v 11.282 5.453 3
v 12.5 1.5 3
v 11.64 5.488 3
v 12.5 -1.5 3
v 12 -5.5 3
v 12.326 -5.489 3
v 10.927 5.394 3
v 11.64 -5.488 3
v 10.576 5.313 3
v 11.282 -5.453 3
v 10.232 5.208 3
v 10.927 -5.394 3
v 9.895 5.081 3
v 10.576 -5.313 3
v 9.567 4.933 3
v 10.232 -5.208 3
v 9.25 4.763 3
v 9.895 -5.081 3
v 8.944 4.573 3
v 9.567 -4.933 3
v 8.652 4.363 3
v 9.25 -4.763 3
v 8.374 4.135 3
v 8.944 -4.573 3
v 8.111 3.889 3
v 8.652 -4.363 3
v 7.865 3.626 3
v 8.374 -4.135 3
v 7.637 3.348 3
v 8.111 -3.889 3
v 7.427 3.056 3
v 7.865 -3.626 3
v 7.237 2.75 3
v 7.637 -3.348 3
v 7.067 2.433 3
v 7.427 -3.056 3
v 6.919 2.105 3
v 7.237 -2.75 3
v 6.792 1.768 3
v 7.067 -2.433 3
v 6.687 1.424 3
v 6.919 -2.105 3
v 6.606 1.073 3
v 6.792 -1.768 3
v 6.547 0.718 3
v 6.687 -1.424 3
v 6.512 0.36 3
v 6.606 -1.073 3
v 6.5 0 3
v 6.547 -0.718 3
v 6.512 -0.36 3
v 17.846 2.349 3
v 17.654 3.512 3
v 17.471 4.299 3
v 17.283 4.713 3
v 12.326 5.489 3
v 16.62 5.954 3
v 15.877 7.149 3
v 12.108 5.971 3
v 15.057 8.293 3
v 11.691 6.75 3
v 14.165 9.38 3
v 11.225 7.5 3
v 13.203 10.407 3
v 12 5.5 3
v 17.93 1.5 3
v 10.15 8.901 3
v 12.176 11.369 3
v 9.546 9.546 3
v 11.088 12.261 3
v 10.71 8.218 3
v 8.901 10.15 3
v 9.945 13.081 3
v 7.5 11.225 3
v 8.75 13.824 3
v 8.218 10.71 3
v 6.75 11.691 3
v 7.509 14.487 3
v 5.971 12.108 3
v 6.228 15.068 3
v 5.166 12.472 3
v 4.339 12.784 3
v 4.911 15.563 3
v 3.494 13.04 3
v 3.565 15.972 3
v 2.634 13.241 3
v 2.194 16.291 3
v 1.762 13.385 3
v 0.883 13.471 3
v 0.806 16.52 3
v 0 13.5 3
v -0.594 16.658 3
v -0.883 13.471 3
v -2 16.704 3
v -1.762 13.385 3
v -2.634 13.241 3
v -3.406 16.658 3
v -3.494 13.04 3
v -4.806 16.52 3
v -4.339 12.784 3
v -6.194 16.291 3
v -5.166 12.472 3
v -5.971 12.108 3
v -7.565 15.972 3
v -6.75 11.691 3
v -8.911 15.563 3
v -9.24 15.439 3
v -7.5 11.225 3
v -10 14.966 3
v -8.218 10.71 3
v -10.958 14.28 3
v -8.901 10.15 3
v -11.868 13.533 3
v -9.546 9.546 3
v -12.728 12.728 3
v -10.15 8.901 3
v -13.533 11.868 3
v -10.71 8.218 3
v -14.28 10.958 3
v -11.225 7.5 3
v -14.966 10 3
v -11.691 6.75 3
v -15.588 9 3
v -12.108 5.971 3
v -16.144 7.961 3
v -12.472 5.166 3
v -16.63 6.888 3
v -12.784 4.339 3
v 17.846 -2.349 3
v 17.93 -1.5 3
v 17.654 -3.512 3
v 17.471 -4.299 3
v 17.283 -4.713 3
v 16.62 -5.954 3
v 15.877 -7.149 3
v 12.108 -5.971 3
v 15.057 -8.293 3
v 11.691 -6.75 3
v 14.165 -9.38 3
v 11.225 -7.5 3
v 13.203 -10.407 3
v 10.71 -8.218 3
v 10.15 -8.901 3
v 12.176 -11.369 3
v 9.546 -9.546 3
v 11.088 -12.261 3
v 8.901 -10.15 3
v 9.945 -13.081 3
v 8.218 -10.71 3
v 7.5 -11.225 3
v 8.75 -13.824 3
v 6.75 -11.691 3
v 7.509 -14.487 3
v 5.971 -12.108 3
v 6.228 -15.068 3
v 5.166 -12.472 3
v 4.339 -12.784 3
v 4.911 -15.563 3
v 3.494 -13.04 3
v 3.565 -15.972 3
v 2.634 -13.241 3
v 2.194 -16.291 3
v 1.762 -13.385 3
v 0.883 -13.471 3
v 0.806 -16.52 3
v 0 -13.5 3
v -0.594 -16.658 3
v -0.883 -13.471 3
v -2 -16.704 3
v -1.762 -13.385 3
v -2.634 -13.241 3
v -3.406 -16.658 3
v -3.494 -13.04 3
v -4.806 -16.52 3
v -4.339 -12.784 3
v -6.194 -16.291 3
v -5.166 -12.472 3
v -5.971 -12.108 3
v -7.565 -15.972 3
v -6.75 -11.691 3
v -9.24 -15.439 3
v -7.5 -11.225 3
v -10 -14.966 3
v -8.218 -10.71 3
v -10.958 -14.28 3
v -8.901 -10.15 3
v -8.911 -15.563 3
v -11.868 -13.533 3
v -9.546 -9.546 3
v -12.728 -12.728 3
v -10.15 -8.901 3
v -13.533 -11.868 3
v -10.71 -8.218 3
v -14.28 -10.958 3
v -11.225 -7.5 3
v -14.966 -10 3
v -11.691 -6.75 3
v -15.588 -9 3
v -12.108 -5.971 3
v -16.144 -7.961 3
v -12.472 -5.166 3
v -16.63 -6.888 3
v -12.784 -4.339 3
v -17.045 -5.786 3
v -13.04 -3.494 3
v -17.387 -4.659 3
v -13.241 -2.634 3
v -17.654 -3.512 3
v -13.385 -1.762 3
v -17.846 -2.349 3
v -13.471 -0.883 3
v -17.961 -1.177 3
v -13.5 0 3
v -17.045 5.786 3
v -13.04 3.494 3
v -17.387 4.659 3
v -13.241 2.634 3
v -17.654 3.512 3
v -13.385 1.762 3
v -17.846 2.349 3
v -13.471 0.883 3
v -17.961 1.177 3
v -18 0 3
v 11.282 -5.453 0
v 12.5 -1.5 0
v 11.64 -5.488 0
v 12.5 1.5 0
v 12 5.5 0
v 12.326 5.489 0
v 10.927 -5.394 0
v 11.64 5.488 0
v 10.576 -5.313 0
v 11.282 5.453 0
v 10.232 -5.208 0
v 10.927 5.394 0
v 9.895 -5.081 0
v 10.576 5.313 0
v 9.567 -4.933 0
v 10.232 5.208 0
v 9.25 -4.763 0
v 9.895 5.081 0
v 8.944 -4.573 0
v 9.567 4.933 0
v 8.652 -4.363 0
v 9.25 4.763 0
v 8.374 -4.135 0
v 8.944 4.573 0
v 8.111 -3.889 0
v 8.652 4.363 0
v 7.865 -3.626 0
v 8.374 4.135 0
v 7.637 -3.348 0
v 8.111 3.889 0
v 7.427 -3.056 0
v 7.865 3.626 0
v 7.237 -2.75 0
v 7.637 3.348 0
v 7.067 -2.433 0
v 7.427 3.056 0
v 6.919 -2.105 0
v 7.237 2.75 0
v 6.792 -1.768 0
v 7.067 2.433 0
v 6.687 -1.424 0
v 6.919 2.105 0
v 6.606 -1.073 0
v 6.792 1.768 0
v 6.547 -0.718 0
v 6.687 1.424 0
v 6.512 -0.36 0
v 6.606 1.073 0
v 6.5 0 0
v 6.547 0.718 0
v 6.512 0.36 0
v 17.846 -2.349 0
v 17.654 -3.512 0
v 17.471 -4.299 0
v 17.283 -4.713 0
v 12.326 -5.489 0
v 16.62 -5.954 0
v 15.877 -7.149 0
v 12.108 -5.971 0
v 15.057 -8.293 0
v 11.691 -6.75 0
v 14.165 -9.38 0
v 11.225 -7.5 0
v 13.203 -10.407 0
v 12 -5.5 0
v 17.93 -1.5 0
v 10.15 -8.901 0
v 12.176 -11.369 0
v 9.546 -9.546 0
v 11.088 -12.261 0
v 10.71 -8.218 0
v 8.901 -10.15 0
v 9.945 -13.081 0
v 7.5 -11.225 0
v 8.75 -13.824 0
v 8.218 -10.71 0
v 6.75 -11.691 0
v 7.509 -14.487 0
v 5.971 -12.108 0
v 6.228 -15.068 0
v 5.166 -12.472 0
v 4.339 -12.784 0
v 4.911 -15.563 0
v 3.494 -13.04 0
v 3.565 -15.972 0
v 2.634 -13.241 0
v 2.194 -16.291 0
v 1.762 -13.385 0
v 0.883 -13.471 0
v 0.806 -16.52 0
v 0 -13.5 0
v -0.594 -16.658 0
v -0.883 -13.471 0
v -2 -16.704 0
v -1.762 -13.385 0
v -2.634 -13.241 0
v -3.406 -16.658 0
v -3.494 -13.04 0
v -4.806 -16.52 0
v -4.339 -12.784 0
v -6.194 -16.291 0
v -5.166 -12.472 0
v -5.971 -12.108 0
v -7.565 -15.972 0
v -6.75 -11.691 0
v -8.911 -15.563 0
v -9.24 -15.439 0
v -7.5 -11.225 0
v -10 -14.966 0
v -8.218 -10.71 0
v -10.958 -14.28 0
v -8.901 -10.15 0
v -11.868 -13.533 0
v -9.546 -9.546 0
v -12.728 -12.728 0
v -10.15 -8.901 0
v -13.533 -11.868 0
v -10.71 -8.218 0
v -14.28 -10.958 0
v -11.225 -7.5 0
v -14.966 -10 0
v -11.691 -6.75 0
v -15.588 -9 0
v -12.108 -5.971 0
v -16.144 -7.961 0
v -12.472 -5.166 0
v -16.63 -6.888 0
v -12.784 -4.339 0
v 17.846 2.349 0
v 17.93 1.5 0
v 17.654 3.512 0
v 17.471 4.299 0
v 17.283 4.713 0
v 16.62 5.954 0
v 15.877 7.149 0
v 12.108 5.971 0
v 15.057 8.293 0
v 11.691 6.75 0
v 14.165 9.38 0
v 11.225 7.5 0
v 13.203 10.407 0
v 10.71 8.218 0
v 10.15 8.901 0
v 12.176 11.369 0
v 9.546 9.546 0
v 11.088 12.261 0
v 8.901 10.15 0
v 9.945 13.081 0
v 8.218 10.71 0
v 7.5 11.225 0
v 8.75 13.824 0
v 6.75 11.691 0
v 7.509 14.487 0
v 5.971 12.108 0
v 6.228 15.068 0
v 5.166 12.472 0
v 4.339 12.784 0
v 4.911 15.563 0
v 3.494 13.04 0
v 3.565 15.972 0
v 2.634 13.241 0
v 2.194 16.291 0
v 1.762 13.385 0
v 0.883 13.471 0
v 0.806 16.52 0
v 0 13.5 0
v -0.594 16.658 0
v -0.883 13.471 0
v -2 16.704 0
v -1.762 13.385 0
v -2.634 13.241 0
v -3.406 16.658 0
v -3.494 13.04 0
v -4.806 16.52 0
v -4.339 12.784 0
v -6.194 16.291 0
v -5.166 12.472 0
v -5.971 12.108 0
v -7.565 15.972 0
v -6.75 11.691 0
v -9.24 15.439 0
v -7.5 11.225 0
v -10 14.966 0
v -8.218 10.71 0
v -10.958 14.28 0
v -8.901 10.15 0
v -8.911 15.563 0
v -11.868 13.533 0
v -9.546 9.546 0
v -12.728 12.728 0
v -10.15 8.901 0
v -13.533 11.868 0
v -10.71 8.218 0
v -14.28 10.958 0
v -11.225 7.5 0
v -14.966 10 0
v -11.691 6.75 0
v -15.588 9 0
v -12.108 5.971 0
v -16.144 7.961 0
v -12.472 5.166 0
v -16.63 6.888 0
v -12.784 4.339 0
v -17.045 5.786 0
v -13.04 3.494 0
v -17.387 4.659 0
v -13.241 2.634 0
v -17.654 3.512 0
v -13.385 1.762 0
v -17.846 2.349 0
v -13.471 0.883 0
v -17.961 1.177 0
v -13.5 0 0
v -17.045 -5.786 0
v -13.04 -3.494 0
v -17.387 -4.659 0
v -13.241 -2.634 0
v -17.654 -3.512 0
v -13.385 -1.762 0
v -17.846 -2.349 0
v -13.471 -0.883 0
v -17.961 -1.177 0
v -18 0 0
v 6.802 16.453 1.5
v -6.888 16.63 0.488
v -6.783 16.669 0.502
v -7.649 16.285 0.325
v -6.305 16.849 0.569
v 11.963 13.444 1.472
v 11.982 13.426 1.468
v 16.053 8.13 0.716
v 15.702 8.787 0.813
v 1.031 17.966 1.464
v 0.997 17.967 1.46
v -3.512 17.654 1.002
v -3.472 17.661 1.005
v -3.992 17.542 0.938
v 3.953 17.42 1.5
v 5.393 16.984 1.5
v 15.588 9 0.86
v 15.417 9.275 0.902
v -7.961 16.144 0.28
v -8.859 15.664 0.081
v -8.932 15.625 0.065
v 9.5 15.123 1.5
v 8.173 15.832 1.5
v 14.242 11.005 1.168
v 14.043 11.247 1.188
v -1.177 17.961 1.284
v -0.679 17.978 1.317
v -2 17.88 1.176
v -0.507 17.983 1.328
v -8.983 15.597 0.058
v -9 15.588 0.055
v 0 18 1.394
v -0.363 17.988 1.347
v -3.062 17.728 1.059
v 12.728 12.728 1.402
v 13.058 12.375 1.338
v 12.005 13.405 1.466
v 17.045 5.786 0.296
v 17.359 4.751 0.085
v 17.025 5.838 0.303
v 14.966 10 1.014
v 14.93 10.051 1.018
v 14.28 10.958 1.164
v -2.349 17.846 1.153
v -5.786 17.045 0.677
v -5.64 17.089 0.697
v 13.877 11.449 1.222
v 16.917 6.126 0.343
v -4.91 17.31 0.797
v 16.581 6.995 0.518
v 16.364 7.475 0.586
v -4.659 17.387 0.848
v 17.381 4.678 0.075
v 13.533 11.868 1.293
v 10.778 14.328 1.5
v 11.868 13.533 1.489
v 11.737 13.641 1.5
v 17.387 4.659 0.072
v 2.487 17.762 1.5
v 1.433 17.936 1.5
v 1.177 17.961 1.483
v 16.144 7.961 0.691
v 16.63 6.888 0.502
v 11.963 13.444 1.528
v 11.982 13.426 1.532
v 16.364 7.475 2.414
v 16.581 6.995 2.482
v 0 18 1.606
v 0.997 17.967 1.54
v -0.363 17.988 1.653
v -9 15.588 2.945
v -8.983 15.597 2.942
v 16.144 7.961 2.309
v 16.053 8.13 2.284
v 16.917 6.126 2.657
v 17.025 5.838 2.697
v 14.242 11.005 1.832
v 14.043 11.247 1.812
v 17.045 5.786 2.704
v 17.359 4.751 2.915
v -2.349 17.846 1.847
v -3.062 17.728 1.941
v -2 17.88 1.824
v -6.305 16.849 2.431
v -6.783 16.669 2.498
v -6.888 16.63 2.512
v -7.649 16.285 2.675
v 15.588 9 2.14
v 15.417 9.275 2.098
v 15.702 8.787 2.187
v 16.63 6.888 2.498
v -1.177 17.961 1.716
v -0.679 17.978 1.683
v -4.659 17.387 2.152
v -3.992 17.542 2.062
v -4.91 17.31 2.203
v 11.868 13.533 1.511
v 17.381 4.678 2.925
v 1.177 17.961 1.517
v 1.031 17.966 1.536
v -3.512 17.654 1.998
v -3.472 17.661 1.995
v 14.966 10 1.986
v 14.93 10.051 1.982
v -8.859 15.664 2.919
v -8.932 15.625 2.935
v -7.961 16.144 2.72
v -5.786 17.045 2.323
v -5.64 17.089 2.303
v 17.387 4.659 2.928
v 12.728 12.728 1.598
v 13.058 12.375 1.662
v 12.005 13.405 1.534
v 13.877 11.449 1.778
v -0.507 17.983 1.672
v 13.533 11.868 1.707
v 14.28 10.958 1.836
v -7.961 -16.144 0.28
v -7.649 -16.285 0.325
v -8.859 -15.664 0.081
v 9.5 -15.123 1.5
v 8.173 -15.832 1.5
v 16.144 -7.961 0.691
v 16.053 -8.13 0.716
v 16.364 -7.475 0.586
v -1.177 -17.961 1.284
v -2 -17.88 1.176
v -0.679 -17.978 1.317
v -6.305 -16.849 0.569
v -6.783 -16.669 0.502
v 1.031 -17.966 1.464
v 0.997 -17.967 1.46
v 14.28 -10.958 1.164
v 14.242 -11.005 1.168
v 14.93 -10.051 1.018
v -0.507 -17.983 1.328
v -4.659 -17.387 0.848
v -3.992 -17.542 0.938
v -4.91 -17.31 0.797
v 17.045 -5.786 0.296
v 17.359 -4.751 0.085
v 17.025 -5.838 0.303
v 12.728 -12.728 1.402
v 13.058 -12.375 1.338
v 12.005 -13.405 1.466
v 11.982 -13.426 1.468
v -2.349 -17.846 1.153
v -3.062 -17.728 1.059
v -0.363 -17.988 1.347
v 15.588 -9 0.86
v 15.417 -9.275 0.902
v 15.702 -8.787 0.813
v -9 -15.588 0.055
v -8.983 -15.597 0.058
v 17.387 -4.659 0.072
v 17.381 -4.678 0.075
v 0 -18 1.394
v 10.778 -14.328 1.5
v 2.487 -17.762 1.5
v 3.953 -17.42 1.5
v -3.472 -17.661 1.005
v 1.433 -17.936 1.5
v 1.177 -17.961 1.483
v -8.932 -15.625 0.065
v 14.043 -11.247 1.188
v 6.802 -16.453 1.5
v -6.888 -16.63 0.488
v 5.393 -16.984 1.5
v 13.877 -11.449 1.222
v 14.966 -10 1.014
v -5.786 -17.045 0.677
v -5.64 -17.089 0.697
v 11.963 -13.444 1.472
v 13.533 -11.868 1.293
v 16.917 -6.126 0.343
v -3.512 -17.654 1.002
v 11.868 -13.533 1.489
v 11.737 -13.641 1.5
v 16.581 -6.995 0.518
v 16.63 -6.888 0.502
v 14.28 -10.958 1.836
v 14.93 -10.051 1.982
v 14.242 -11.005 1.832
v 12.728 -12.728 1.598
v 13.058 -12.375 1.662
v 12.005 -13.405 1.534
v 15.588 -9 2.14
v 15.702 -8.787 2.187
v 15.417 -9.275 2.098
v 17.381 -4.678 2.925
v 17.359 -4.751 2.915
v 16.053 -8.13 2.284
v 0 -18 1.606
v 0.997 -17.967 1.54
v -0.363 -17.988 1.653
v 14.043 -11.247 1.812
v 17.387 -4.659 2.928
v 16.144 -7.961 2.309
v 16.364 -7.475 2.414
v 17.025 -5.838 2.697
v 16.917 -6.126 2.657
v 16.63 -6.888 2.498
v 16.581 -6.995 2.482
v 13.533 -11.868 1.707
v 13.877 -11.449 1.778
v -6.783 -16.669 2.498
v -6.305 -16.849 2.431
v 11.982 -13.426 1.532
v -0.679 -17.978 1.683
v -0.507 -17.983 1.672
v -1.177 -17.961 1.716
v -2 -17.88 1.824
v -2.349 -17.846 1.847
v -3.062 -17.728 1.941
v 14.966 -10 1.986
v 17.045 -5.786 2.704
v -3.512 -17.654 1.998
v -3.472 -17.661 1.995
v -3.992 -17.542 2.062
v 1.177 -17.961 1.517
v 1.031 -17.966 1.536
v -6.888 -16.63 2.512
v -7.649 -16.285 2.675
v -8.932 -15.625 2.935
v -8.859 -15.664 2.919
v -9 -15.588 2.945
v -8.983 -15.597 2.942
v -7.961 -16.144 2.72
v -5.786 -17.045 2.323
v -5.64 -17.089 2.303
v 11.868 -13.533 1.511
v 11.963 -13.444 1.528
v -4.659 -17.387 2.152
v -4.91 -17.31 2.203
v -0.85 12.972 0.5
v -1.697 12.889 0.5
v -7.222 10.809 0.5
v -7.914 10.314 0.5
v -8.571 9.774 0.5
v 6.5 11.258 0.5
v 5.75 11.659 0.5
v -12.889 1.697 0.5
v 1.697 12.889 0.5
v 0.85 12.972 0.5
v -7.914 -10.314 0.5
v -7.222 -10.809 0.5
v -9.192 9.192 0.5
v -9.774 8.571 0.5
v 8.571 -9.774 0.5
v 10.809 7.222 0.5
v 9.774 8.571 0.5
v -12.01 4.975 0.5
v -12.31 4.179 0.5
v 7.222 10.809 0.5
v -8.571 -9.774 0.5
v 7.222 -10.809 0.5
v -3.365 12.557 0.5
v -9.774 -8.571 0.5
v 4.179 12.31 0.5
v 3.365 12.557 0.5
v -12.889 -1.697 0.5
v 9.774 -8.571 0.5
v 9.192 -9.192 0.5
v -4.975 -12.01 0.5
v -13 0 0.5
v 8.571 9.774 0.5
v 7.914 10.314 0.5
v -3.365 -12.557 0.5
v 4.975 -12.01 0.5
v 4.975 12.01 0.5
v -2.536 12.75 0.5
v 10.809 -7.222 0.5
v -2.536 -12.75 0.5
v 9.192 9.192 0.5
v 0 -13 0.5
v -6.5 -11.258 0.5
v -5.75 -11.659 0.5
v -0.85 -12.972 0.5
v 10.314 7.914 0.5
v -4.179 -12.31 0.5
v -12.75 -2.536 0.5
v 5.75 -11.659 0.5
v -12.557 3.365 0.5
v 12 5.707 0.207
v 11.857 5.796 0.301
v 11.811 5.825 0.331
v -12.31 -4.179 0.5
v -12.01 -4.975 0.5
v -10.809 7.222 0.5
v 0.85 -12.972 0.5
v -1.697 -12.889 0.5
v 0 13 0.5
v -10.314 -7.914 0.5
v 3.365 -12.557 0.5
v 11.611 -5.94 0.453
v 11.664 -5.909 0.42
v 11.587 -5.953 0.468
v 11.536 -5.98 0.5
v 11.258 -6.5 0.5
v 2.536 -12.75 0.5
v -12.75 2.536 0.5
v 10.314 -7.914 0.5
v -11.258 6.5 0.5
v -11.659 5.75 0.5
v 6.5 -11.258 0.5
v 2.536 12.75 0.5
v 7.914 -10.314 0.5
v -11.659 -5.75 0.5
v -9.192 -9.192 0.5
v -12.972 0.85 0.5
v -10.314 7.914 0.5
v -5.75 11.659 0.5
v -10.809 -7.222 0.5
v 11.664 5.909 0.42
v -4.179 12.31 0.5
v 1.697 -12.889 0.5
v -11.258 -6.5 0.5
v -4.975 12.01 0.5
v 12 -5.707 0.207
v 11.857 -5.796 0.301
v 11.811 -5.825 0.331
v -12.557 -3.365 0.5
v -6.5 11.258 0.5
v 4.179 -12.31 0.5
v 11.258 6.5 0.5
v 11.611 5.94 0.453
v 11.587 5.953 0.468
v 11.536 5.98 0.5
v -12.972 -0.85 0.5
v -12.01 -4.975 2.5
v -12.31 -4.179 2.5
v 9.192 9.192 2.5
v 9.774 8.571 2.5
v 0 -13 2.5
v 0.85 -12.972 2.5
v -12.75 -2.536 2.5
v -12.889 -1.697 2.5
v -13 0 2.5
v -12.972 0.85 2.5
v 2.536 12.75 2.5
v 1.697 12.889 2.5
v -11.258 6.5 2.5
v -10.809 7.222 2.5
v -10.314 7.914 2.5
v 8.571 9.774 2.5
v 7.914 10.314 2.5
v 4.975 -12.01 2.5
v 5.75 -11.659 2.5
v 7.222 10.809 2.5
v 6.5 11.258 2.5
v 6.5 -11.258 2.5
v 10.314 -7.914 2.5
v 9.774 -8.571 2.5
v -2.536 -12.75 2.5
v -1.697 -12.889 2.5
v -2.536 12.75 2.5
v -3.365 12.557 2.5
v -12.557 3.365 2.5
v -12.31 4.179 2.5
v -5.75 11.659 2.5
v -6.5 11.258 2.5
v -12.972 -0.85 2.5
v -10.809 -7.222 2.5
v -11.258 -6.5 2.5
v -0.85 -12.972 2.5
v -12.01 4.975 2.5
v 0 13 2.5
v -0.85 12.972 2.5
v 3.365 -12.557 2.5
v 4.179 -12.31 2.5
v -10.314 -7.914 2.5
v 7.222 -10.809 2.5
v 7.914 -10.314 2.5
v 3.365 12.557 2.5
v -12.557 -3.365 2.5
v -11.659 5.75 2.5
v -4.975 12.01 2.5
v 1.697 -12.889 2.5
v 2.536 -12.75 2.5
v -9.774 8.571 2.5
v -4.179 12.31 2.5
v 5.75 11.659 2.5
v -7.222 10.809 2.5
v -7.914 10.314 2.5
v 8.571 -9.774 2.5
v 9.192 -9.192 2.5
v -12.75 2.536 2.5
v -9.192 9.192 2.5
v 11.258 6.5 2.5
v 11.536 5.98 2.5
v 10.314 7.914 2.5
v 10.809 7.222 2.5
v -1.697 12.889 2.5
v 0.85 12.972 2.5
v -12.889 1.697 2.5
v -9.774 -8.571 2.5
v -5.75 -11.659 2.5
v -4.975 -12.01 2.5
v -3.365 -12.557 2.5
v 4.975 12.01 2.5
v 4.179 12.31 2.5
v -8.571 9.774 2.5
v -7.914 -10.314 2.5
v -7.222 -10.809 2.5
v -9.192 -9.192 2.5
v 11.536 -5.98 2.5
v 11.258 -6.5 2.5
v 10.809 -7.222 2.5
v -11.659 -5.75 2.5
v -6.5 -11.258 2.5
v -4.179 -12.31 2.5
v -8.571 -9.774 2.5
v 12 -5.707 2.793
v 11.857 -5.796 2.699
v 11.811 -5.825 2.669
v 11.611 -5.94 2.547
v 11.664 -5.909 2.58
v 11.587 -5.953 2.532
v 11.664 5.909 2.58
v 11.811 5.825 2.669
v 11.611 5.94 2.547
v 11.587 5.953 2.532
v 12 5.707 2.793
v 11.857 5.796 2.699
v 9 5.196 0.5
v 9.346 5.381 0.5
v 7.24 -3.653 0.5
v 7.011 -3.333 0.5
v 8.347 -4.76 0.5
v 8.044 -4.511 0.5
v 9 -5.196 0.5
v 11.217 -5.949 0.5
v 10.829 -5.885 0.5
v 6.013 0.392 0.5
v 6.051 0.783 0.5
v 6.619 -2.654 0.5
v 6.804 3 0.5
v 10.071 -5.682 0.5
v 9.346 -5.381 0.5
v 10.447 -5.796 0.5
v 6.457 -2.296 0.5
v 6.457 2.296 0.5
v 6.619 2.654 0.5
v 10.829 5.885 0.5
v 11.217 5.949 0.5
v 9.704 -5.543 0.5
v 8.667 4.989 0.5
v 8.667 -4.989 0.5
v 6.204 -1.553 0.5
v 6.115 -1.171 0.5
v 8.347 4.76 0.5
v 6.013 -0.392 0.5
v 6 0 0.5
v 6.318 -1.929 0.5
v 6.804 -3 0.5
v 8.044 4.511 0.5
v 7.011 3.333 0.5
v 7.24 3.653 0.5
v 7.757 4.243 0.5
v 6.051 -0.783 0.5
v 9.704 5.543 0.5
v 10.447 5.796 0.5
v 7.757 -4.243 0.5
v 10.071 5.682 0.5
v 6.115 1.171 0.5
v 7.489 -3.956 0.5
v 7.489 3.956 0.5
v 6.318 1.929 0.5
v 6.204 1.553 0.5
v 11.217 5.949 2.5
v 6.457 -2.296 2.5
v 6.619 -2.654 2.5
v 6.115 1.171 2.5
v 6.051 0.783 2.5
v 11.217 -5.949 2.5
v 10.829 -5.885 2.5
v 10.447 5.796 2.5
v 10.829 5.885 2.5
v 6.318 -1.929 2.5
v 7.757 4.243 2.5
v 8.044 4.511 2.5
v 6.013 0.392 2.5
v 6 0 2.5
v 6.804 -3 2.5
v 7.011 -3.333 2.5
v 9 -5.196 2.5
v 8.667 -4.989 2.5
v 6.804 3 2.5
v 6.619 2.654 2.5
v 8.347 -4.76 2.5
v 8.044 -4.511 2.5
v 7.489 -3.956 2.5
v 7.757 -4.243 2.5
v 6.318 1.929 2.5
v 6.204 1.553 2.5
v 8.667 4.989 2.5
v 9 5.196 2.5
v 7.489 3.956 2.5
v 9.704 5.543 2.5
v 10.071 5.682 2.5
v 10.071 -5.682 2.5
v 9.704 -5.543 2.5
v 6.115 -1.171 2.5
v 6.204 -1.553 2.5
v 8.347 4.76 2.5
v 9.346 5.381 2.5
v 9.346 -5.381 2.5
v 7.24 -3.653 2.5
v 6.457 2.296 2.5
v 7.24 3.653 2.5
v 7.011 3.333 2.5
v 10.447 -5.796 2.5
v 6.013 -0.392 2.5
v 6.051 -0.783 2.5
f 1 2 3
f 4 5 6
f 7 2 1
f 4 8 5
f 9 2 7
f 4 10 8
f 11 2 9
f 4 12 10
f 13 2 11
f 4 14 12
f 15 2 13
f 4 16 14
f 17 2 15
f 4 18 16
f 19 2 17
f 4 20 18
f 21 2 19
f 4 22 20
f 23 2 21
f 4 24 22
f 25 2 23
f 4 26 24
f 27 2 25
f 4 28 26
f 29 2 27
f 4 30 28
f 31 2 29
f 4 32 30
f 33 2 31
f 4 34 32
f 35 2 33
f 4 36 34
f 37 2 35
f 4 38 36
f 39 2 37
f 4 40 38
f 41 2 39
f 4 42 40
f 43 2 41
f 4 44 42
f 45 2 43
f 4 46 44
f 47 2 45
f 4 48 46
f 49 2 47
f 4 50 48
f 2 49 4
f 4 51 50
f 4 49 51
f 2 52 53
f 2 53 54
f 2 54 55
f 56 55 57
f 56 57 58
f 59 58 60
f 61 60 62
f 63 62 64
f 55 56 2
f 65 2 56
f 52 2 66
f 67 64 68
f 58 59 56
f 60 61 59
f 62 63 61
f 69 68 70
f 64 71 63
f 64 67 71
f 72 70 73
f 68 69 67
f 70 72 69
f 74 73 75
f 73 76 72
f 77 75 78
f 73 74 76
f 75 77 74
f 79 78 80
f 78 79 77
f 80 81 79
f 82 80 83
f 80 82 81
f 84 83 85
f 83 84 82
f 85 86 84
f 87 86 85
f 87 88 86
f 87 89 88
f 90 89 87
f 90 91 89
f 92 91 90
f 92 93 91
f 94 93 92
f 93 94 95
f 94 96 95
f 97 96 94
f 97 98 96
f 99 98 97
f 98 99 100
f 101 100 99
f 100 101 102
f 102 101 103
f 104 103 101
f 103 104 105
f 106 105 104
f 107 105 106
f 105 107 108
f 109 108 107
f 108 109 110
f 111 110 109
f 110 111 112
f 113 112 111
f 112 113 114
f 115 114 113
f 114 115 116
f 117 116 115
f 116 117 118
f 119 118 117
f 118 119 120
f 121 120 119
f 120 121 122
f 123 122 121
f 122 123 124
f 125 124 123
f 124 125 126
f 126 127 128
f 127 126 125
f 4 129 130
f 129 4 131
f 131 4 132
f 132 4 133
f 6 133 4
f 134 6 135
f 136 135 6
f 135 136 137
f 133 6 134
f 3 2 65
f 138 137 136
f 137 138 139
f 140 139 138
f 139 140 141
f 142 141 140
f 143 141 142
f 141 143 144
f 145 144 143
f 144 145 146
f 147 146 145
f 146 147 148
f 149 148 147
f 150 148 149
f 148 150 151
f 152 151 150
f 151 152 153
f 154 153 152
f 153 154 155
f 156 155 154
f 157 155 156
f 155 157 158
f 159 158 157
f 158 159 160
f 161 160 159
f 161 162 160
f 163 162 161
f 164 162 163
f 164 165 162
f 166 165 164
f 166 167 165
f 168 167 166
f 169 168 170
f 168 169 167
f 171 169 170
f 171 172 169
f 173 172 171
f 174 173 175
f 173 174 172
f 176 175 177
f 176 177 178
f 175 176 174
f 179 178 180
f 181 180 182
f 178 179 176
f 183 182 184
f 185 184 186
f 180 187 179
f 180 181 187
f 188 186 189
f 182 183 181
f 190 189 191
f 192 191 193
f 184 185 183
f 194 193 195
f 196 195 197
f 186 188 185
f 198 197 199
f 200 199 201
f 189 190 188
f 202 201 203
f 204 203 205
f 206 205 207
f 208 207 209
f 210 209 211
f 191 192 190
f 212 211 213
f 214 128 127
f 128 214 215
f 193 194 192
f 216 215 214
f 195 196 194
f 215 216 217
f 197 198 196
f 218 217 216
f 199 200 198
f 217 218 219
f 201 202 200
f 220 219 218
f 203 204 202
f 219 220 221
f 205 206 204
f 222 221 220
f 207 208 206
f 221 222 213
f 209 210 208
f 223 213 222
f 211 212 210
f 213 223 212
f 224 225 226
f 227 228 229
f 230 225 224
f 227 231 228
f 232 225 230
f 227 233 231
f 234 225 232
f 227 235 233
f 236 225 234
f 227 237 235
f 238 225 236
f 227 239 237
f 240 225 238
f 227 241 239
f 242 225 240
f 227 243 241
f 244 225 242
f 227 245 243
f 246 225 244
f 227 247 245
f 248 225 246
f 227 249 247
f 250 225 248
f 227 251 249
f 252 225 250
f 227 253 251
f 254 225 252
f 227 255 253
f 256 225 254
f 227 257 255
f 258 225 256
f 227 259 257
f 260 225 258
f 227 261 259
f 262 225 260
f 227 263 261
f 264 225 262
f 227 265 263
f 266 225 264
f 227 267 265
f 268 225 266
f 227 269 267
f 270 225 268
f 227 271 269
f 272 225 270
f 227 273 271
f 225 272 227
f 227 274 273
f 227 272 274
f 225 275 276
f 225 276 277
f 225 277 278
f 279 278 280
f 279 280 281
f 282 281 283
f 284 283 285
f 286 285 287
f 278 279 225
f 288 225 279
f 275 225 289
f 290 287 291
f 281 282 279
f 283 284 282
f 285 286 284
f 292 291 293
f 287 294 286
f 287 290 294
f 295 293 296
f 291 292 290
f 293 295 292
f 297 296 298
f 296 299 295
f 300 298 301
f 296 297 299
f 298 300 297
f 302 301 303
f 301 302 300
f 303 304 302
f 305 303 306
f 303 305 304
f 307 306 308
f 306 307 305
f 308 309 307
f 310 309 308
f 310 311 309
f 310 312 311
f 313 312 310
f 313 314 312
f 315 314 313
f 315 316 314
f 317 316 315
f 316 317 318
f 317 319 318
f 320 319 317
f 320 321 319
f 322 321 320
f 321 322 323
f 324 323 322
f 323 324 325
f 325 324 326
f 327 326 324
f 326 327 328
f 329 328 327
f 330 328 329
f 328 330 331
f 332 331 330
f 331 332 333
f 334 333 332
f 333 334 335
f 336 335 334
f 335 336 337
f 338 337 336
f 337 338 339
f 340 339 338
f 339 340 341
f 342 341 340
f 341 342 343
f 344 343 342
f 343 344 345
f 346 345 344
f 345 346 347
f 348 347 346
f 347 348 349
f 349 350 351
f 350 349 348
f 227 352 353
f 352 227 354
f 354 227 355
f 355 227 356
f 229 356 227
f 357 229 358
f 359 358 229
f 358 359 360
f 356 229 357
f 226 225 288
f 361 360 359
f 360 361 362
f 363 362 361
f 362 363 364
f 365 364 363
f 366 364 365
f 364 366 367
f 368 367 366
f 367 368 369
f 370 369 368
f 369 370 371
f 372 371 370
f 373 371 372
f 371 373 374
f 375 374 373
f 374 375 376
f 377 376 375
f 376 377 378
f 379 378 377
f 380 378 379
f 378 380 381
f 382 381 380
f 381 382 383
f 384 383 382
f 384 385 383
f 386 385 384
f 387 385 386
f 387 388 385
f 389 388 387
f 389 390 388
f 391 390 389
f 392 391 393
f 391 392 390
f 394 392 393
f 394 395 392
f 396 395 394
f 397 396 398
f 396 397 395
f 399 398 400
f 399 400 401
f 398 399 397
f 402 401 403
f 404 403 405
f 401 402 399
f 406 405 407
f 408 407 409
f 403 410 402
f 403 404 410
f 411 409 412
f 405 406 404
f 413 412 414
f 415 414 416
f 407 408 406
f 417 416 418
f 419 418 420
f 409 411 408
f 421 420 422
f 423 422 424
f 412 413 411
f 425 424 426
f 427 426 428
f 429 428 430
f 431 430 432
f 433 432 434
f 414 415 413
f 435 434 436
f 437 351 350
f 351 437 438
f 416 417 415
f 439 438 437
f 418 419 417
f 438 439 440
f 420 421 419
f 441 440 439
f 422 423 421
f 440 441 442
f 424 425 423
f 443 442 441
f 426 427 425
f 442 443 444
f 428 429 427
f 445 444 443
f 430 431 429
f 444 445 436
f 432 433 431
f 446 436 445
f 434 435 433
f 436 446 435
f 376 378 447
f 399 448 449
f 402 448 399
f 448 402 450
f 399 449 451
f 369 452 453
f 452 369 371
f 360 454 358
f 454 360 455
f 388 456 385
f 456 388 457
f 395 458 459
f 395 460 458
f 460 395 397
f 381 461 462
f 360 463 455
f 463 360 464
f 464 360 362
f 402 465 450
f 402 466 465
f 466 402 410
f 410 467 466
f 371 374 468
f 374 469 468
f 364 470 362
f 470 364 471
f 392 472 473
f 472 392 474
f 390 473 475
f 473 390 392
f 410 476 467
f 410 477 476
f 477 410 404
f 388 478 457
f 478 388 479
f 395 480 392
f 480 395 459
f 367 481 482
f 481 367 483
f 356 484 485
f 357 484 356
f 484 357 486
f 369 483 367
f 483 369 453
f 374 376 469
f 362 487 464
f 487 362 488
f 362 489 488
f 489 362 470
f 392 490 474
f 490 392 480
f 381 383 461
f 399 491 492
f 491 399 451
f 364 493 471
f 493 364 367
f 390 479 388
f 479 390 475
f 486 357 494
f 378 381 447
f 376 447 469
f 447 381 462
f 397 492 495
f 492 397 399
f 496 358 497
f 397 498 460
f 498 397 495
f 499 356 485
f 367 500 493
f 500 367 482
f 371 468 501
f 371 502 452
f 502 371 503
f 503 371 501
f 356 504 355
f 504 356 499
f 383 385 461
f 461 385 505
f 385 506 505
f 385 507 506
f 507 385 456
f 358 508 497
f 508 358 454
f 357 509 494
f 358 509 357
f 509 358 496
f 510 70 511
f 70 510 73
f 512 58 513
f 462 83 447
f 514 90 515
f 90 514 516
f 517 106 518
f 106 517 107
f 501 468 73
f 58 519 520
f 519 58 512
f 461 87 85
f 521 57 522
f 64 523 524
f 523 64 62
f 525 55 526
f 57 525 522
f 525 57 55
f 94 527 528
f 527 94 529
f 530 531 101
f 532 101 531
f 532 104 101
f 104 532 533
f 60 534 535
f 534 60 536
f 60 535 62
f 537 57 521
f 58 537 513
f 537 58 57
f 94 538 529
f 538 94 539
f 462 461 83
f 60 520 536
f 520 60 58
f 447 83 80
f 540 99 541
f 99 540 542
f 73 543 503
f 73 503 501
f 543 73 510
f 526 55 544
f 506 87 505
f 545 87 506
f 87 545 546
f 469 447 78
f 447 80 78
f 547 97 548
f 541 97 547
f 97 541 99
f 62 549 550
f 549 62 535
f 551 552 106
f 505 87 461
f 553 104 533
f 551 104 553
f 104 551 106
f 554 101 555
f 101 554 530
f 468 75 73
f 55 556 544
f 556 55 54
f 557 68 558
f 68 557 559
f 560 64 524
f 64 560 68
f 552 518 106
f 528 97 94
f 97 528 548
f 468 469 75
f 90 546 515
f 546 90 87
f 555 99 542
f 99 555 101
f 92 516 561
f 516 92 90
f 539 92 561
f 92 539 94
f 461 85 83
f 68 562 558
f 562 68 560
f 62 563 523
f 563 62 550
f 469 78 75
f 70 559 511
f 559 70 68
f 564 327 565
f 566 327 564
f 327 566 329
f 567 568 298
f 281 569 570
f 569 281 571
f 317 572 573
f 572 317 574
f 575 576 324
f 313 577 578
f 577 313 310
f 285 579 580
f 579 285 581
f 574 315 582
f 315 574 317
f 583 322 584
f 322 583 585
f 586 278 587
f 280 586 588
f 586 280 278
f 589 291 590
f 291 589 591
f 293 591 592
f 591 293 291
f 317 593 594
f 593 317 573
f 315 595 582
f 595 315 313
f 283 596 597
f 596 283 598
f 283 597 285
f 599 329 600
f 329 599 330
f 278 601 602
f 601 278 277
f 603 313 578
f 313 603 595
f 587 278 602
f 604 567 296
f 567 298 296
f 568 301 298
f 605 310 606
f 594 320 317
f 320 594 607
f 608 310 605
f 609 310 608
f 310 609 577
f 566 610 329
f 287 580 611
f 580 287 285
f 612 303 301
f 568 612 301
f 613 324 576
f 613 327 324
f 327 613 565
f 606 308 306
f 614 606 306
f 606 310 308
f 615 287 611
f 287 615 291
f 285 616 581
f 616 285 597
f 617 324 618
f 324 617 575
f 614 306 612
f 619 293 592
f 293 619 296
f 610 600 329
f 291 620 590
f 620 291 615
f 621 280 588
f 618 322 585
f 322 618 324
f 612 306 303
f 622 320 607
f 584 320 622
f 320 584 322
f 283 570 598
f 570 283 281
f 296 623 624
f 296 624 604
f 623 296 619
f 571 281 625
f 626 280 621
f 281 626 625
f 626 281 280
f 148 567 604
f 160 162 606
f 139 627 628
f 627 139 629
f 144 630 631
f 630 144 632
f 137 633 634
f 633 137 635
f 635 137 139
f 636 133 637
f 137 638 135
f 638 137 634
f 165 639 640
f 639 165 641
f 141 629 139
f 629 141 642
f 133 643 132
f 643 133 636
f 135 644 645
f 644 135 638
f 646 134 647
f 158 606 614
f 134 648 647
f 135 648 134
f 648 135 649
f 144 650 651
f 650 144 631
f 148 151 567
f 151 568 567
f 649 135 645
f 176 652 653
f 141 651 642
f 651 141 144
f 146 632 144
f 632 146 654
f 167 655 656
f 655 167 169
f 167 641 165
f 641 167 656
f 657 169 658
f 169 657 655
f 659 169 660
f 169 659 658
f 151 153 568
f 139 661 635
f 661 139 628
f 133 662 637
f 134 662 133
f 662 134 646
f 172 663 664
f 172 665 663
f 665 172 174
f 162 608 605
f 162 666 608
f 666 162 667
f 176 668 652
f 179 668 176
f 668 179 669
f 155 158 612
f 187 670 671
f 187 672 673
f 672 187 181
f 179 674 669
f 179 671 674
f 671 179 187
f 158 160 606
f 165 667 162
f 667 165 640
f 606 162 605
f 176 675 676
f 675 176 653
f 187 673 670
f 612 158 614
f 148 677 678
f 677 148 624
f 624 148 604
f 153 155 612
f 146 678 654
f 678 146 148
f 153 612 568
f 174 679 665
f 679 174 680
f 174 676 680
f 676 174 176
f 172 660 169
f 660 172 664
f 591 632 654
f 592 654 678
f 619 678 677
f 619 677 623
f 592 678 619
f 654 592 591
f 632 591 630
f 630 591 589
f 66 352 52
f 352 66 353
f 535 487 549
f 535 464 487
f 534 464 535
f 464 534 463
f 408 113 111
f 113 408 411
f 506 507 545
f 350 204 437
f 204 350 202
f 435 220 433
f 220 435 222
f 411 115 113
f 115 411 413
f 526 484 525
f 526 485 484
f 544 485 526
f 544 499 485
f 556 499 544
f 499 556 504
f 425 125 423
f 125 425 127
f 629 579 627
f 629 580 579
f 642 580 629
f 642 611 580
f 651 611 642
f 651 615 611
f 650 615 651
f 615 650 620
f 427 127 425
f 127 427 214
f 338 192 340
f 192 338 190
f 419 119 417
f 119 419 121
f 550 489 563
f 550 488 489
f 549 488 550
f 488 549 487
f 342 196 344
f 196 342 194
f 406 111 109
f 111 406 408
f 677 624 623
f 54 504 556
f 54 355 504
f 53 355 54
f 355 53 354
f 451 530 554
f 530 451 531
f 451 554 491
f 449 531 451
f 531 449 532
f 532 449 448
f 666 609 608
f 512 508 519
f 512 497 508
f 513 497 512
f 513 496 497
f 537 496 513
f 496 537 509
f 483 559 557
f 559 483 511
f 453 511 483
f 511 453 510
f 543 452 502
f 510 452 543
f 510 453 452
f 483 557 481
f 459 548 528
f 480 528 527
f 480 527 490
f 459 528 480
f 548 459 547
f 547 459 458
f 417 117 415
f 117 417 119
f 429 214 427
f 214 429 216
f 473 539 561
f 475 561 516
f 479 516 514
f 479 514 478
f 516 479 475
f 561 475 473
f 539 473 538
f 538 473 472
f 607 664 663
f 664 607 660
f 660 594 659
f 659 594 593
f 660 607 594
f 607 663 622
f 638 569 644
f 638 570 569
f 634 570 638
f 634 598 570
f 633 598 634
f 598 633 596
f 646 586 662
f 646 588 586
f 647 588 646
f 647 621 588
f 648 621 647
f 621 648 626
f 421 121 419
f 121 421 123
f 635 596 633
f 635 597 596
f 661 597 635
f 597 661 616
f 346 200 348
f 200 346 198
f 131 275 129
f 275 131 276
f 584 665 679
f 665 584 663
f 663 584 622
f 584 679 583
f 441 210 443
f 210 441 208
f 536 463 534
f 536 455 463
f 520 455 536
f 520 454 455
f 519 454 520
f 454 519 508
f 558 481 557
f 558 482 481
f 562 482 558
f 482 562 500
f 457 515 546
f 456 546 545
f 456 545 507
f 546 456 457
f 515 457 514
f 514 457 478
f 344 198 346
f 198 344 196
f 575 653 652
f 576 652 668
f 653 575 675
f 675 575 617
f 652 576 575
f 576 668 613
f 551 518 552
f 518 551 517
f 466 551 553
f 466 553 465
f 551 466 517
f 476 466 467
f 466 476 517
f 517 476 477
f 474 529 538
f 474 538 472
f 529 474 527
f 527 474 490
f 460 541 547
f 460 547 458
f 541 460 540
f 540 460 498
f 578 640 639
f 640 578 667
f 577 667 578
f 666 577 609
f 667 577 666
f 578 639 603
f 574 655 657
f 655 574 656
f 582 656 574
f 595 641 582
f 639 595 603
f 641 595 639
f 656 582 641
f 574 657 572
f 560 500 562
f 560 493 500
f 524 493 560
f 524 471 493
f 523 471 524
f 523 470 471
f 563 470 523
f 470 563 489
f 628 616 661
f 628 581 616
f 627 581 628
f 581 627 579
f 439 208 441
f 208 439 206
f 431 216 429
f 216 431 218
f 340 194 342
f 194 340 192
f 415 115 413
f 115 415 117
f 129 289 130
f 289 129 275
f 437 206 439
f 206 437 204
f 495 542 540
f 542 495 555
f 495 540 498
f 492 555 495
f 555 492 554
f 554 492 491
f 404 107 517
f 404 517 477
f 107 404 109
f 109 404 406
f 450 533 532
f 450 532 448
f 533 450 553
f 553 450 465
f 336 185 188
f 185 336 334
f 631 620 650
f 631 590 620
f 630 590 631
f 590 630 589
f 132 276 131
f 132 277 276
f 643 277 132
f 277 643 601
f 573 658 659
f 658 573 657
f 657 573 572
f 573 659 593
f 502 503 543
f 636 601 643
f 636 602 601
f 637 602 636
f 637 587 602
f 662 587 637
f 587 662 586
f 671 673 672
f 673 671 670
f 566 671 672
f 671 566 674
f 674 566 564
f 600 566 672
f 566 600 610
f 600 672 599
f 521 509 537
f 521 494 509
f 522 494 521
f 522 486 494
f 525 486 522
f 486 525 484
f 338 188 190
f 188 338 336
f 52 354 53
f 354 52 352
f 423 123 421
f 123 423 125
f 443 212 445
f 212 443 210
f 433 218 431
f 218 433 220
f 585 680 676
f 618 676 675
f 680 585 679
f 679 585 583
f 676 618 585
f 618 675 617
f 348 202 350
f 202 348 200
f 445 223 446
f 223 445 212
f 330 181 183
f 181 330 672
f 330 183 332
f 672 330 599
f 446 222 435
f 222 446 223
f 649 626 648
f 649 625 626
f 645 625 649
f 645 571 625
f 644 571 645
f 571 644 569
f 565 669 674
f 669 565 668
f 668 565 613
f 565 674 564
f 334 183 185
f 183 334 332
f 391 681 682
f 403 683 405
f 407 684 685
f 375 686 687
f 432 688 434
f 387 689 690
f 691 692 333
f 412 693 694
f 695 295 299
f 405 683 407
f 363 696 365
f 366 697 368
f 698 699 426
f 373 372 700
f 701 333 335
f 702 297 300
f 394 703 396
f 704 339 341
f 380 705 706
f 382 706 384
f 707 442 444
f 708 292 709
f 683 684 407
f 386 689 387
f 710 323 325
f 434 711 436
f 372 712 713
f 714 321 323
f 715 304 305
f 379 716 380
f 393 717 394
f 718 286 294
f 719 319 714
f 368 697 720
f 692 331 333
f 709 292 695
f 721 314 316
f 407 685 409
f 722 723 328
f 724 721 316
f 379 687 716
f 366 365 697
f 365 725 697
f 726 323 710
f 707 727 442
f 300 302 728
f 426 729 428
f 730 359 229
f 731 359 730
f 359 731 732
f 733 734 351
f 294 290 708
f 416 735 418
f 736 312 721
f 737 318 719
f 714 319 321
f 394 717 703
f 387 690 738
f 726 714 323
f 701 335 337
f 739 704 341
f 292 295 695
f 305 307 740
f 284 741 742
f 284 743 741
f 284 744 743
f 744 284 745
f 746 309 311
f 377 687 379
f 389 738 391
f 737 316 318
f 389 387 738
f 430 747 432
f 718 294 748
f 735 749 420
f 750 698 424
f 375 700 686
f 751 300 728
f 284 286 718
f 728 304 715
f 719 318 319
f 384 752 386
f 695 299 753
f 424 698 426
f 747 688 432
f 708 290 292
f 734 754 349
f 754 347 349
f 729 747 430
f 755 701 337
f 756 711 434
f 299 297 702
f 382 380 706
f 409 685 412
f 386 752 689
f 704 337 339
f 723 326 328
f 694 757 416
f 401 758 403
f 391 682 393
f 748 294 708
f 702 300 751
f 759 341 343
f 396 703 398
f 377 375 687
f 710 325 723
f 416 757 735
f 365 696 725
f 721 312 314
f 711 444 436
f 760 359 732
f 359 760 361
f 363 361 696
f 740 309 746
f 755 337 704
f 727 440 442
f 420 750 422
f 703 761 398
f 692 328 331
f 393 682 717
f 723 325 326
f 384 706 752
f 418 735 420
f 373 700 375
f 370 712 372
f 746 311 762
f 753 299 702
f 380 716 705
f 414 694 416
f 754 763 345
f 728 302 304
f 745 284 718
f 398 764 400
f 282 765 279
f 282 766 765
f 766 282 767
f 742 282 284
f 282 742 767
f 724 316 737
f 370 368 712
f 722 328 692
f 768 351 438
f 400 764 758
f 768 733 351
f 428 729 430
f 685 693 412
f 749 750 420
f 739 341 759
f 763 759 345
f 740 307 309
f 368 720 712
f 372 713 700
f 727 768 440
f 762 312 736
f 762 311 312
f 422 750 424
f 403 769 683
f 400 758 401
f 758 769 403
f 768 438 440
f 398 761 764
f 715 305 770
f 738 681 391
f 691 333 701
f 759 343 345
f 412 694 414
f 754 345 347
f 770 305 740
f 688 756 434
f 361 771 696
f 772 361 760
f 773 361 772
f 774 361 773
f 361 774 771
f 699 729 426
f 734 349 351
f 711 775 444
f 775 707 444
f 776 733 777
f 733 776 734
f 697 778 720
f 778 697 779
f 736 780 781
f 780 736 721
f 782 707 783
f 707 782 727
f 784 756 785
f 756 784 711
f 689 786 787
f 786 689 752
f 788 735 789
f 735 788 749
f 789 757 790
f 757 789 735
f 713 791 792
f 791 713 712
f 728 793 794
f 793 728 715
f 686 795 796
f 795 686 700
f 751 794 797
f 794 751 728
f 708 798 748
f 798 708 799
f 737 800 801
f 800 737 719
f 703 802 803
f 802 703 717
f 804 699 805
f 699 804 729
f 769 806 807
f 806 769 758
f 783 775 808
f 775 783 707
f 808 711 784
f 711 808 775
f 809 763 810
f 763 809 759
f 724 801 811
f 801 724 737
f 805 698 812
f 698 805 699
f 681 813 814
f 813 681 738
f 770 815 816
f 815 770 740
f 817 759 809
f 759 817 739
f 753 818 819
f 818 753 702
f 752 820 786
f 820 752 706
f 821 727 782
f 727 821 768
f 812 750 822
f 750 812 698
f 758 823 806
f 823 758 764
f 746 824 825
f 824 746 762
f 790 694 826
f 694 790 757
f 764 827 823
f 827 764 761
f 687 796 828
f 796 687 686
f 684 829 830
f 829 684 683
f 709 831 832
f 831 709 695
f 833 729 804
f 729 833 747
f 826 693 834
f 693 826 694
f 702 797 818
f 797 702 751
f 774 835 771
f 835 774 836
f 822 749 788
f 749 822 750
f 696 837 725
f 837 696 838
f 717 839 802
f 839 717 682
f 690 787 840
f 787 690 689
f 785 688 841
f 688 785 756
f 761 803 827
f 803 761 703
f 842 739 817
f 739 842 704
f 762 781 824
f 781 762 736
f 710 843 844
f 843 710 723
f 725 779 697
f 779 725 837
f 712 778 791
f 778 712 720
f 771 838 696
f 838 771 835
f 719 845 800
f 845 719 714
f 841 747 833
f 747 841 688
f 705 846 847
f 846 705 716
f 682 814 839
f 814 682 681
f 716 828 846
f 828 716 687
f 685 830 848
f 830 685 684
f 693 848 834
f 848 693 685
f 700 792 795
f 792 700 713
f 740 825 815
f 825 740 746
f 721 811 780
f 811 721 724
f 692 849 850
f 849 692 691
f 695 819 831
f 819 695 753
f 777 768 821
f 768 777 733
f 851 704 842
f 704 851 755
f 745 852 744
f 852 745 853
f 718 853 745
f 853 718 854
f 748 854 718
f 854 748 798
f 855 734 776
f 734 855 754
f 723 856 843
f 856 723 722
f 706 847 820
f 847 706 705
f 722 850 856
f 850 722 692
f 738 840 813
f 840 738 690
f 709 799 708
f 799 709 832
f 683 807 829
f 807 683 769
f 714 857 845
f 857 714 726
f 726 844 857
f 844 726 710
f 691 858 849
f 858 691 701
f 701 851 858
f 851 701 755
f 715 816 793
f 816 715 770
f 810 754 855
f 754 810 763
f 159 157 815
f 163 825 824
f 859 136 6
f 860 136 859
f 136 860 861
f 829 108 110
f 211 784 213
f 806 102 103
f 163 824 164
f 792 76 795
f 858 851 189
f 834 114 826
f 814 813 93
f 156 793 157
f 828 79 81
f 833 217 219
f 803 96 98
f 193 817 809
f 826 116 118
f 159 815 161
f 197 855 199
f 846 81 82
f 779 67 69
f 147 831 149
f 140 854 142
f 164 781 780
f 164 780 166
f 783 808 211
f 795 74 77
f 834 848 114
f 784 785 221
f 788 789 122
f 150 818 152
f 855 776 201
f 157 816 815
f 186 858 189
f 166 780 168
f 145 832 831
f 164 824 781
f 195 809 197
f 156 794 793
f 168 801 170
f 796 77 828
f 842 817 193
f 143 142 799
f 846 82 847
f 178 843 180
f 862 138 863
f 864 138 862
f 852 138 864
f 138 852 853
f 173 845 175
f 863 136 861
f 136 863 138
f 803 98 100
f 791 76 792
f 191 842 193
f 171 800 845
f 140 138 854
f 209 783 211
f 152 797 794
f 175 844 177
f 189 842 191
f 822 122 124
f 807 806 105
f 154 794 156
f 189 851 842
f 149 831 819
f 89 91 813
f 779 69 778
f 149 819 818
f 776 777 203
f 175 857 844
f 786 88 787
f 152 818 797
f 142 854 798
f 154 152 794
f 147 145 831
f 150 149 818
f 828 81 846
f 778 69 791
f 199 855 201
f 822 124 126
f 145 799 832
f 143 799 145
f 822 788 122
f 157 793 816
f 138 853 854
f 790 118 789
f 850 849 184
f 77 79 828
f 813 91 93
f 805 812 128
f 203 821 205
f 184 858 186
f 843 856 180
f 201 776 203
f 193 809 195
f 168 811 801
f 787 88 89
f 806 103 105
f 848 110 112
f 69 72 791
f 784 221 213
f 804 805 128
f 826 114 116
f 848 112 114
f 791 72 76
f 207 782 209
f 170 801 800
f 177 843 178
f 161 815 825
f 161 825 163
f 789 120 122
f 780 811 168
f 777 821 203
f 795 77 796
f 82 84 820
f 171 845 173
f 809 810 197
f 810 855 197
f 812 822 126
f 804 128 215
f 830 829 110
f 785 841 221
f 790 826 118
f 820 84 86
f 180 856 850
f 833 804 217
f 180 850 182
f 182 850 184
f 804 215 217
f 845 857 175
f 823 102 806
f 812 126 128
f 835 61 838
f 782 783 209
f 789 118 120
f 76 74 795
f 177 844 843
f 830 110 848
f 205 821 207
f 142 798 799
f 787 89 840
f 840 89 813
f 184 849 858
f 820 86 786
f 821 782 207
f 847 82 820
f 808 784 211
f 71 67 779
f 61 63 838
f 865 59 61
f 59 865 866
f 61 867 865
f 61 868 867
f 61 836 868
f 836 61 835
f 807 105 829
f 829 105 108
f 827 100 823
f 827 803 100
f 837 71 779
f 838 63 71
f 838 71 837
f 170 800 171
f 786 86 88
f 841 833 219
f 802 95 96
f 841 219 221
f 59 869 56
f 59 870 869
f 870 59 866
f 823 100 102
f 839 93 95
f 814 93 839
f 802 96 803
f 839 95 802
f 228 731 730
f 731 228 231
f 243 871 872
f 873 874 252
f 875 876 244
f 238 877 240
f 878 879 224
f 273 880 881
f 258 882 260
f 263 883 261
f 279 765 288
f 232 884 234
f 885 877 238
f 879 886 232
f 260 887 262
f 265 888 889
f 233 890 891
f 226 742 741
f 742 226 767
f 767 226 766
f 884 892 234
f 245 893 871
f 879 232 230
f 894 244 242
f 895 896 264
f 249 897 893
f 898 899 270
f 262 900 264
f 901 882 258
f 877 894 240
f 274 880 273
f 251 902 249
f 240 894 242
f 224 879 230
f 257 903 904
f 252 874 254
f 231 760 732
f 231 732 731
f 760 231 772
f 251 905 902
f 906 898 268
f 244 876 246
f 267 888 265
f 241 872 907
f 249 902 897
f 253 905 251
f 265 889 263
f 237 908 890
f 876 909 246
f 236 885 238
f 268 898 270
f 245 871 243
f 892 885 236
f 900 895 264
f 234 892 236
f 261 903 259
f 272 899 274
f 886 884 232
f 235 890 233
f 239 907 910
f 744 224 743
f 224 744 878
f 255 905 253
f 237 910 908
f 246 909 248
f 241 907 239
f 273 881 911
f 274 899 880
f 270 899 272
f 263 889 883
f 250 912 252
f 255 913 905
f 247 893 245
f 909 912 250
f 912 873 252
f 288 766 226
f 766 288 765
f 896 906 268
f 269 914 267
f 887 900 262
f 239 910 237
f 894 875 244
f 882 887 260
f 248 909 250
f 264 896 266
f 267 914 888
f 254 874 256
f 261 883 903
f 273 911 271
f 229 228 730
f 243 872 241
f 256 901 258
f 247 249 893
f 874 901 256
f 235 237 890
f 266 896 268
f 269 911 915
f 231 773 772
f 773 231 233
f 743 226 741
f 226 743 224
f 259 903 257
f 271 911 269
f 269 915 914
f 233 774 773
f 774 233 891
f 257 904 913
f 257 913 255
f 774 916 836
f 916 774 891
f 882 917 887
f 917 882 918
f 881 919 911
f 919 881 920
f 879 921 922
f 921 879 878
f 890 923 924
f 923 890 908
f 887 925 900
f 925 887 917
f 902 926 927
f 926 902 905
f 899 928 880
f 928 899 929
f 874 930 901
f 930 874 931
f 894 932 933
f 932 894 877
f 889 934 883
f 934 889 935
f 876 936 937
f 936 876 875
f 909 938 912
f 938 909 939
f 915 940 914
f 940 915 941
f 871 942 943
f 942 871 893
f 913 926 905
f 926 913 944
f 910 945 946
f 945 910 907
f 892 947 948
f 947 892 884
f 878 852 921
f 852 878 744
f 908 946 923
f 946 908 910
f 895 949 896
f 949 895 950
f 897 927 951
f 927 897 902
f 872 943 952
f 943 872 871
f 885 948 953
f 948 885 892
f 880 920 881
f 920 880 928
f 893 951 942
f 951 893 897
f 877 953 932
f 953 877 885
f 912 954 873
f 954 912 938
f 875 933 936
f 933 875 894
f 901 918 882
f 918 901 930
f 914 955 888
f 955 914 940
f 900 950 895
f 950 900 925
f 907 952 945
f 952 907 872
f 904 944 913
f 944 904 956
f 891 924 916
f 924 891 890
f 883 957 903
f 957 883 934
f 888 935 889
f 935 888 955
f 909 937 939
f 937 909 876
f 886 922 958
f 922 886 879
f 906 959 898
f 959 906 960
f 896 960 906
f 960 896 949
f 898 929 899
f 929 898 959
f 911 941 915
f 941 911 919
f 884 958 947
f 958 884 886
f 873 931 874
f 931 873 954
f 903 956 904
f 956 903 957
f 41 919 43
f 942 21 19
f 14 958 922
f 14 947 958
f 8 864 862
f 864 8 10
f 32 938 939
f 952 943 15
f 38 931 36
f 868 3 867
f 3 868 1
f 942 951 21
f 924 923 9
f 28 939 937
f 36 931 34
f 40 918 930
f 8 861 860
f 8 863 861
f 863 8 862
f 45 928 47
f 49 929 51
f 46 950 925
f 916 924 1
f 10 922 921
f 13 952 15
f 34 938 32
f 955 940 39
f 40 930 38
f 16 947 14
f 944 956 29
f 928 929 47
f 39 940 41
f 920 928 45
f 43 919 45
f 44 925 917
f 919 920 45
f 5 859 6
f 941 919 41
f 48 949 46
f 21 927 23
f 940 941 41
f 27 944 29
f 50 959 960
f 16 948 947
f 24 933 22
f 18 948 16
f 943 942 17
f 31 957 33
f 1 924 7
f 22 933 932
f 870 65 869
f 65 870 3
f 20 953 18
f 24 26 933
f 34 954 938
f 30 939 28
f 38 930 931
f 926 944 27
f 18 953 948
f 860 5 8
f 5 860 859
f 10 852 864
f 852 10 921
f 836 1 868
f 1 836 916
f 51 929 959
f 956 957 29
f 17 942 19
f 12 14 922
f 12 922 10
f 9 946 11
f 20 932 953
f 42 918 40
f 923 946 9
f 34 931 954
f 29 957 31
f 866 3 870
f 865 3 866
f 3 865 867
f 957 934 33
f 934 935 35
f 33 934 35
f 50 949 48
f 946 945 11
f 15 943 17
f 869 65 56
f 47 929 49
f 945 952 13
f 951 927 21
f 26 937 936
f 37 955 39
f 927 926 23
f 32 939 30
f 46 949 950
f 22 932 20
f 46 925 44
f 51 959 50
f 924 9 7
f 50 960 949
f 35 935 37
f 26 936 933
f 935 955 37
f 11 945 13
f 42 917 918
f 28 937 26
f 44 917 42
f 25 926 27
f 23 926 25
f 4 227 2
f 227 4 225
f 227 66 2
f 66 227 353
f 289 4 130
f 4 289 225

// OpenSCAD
// [FL_INDEX: keywords="openscad, 3d_parametric, The_Minimalist_Wobbler__Customizable, csg_solid" | COT="Parametric OpenSCAD design from 3DCodeverse"]
// Title: The Minimalist Wobbler (Customizable)

// Minimalist Wobbler
// Version 1.0
// Luigi Cisana, 17 May, 2013

outer_diameter=36;

hole_diameter=26;

thickness=3; // [1:5]

/* [Hidden] */
$fn=96;
facet=0.5;

height=thickness;
radius=outer_diameter/2;
iradius=hole_diameter/2;

sradius=radius-iradius+1;
slot=sradius;

x1=2;
y1=sqrt(pow(5,2)-x1);

difference() {
	union() {
		difference() {
			cylinder(h=height,r=radius);	
			translate ([-x1,-y1,0]) difference() {
				cylinder(h=height,r=radius+10);
				cylinder(h=height/2,r1=radius-height/2+5,r2=radius+5);
				translate([0,0,height/2]) cylinder(h=height/2,r1=radius+5,r2=radius-height/2+5);
			}
			translate ([-x1,y1,0]) difference() {
				cylinder(h=height,r=radius+10);
				cylinder(h=height/2,r1=radius-height/2+5,r2=radius+5);
				translate([0,0,height/2]) cylinder(h=height/2,r1=radius+5,r2=radius-height/2+5);
			}
			cylinder(h=facet,r1=iradius+facet,r2=iradius);
			translate ([0,0,facet]) cylinder(h=height-2*facet,r1=iradius,r2=iradius);
			translate ([0,0,height-facet]) cylinder(h=facet,r1=iradius,r2=iradius+facet);
		}
		translate([radius-slot,0,0]) cylinder(h=facet,r1=sradius-facet,r2=sradius);
		translate([radius-slot,0,facet]) cylinder(h=height-2*facet,r=sradius);
		translate([radius-slot,0,height-facet]) cylinder(h=facet,r1=sradius,r2=sradius-facet);
	}  //union
	translate([radius-slot+facet,-height/2,0]) cube(size=[slot,height,height],center=false);
}
